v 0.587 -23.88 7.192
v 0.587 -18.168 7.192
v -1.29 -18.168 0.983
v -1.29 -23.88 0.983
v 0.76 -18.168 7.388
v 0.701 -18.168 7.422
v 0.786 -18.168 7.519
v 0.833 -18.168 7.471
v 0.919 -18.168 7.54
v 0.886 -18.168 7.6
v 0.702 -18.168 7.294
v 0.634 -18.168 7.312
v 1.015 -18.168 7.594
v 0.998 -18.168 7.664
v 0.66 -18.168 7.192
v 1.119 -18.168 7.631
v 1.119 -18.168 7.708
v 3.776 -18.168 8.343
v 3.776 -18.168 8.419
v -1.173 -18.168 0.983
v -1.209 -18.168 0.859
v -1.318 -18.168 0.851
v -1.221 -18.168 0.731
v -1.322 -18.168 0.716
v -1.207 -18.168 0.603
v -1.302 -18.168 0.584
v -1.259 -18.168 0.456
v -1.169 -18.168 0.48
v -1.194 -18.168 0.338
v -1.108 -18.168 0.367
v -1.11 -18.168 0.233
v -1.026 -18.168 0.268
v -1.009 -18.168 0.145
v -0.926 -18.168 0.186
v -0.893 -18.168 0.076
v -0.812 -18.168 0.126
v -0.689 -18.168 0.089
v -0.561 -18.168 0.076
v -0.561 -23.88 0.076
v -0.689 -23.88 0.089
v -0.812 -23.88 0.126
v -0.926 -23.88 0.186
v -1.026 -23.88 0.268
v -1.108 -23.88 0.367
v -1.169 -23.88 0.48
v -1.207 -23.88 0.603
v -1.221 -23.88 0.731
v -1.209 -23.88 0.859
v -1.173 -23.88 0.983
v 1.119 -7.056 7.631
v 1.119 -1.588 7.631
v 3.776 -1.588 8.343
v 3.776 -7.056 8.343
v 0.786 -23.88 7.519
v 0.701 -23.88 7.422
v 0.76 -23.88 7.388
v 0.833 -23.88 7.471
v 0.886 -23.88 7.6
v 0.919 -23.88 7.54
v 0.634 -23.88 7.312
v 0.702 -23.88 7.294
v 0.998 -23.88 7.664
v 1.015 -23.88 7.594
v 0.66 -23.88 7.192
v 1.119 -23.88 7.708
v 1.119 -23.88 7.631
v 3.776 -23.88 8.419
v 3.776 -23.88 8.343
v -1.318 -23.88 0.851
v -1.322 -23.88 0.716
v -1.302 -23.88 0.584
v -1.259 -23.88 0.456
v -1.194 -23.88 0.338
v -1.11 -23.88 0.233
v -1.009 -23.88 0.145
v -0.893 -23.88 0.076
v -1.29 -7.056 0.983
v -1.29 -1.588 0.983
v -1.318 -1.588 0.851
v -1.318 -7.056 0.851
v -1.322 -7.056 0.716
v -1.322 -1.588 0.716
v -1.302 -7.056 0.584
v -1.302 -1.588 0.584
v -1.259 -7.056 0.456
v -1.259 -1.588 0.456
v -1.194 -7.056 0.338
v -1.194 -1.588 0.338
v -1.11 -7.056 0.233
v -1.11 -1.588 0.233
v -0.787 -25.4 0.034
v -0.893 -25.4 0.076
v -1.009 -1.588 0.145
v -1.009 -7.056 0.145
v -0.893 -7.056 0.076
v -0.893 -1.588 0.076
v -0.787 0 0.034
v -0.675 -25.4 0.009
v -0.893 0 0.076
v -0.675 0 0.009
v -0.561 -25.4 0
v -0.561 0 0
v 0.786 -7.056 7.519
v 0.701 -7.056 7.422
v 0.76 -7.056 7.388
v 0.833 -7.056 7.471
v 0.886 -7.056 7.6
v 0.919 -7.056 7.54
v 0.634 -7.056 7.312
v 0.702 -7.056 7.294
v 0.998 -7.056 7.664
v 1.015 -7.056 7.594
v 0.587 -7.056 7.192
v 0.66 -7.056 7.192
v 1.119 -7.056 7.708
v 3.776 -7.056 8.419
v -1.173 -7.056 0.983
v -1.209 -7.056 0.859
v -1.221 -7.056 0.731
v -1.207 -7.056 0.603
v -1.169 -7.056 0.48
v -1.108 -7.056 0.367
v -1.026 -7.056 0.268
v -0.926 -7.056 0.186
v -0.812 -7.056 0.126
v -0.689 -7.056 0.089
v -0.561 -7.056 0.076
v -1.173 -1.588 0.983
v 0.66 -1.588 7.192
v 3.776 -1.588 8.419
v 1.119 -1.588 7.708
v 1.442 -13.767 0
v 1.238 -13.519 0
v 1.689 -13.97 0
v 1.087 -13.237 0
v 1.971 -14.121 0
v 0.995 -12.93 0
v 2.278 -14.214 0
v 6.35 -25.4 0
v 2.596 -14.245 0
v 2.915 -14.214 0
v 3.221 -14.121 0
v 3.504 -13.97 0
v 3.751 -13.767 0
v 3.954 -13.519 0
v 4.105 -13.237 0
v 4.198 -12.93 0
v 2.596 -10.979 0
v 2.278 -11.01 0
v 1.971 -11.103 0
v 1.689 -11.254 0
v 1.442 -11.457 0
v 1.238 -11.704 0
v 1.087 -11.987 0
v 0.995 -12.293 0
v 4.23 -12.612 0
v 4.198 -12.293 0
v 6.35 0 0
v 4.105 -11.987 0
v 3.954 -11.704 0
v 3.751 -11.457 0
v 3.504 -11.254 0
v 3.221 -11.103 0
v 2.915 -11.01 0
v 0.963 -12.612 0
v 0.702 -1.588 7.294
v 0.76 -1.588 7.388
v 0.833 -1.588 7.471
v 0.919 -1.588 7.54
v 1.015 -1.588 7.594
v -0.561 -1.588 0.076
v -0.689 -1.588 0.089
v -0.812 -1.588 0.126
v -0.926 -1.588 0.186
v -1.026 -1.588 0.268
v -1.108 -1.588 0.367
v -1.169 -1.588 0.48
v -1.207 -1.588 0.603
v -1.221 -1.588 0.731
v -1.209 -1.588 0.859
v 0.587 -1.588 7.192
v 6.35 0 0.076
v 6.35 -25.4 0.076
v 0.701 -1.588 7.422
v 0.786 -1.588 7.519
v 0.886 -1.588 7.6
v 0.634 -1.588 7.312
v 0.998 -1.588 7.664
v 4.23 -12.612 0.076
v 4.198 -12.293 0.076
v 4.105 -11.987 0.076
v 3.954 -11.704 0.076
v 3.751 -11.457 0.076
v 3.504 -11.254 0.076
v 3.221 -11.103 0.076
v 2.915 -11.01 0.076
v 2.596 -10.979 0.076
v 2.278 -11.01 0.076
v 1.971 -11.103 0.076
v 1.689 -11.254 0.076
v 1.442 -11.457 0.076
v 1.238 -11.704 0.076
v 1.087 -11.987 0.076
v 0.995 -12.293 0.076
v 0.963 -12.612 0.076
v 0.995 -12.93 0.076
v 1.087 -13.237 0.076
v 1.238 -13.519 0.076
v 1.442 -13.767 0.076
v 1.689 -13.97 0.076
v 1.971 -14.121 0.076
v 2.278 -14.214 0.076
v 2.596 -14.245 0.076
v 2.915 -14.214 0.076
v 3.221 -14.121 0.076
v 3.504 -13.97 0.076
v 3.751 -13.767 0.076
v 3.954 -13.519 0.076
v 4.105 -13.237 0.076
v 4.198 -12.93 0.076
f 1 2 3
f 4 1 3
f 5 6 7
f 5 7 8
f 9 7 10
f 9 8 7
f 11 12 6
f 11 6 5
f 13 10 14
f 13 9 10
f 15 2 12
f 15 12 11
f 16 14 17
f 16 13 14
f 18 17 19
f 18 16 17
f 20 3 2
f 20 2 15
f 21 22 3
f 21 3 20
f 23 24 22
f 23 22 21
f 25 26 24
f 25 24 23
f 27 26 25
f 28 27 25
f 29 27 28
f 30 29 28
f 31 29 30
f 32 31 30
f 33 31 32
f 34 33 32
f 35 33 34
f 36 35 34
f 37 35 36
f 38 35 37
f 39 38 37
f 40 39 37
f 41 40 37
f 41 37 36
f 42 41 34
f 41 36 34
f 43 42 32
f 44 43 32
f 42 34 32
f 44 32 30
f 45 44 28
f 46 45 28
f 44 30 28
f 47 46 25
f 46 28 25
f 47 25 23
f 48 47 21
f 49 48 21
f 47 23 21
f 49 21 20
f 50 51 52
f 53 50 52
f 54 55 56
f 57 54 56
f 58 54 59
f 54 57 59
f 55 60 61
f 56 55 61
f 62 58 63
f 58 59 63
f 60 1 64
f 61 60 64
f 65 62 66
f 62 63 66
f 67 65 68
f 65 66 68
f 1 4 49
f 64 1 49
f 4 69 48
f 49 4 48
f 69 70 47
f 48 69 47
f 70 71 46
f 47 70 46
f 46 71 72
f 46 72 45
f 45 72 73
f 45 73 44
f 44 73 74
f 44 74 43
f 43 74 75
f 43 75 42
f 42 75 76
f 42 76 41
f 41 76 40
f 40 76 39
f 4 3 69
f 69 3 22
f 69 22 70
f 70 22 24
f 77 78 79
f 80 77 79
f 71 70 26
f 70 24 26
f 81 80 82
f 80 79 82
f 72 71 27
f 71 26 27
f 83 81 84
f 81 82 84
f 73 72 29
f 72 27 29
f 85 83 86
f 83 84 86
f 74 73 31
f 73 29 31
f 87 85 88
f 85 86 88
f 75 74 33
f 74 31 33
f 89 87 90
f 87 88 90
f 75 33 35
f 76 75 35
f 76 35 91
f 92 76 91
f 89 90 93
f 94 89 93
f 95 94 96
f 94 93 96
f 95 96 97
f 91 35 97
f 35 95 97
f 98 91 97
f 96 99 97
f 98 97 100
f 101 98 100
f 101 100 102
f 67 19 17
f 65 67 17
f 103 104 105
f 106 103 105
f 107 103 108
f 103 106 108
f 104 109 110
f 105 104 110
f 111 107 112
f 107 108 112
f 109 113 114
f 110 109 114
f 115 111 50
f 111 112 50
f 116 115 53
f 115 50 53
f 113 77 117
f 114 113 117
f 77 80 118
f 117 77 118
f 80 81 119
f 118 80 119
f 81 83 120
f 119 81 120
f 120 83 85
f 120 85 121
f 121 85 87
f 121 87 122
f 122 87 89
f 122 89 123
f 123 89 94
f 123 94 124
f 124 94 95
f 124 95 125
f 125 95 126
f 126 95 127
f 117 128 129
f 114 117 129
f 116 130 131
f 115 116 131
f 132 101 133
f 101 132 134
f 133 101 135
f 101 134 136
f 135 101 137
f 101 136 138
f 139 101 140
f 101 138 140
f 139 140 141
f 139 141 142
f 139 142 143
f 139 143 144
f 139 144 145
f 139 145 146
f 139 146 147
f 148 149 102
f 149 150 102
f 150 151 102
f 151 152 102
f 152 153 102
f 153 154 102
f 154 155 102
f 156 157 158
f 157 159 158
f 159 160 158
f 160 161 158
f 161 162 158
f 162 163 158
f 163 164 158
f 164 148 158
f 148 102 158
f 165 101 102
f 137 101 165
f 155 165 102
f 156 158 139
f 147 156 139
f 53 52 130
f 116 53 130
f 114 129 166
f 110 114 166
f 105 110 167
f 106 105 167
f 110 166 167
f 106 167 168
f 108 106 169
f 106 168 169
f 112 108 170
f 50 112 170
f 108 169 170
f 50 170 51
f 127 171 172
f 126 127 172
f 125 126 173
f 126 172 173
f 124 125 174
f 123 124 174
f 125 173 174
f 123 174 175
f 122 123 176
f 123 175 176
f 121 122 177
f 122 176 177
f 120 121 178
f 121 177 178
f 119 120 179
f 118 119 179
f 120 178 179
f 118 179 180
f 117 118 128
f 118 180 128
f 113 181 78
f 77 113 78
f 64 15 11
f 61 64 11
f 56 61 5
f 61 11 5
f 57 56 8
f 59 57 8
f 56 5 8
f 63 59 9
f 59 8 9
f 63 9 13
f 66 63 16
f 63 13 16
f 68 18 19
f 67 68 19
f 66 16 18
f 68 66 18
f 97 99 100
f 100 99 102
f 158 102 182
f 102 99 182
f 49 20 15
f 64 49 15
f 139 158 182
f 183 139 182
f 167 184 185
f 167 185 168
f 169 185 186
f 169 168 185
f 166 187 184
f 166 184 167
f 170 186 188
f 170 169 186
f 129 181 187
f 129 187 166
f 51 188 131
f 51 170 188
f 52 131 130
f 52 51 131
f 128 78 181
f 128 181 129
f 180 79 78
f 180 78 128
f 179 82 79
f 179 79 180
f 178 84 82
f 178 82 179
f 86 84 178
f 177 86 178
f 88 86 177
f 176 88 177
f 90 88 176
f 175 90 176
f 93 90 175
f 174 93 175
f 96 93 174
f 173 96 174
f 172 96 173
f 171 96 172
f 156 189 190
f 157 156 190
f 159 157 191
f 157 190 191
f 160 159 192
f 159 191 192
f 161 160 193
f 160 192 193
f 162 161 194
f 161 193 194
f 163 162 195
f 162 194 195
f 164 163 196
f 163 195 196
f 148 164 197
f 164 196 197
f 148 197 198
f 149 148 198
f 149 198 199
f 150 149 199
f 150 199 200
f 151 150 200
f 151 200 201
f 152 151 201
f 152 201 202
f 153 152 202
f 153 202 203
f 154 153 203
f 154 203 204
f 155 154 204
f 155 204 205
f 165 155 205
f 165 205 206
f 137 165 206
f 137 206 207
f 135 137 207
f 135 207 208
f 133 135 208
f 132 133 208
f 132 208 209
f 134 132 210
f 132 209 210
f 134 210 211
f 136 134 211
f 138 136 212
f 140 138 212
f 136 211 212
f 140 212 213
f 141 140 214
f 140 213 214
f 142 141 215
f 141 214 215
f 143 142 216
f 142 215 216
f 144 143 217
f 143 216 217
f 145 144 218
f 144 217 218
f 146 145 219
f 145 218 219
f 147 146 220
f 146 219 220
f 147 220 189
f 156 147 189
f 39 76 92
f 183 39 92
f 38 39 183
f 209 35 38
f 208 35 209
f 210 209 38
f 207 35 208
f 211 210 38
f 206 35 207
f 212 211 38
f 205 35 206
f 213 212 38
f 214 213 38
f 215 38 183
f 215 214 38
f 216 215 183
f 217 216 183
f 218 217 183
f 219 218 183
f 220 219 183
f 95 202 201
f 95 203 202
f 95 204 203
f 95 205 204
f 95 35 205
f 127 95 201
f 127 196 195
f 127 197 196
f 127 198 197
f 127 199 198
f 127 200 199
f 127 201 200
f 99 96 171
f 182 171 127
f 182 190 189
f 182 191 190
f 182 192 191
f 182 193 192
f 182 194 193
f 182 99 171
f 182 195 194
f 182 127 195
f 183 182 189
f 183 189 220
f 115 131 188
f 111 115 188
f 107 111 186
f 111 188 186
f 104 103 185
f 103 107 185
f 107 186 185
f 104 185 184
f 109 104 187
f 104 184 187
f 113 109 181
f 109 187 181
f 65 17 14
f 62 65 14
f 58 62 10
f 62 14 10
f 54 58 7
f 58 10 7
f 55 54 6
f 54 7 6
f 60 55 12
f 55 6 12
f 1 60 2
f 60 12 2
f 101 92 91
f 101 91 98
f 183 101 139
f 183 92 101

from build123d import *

# Parameters (mm, degrees)
F1_DEPTH = 25.4
F3_W     = 8.148129
F3_H     = 5.55625
F3_W_2   = 7.948229
F3_H_2   = 1.5875
F3_W_3   = 8.837929
F4_DEPTH = 25.4
F5_R     = 1.633227
F6_DEPTH = 25.4


with BuildPart() as f1:
    # F0 (on Front) → F1 (new body)
    with BuildSketch(Plane.XZ):
        with BuildLine():
            Line((-0.561085, 0), (0, 0))
            Line((0, 0), (6.35, 0))
            Line((6.35, 0), (6.35, 0.0762))
            Line((6.35, 0.0762), (-0.561085, 0.0762))
            ThreePointArc((-0.561085, 0.0762), (-1.107829, 0.366771), (-1.172913, 0.982501))
            Line((-1.172913, 0.982501), (0.660235, 7.192055))
            ThreePointArc((0.660235, 7.192055), (0.833247, 7.470557), (1.118945, 7.631408))
            Line((1.118945, 7.631408), (3.776279, 8.343177))
            Line((3.776279, 8.343177), (3.776279, 8.419377))
            Line((3.776279, 8.419377), (1.118945, 7.707608))
            ThreePointArc((1.118945, 7.707608), (0.785934, 7.518885), (0.586698, 7.192055))
            Line((0.586698, 7.192055), (-1.290484, 0.982501))
            ThreePointArc((-1.290484, 0.982501), (-1.172913, 0.307785), (-0.561085, 0))
        make_face()
    extrude(amount=F1_DEPTH)

    # F3 (on offset) → F4 (cut)
    with BuildSketch(Plane.XY.offset(0.0762)):
        with Locations((1.40282, -9.833681)):
            Rectangle(F3_W, F3_H)
        with Locations((0.910564, -0.79375)):
            Rectangle(F3_W_2, F3_H_2)
        with Locations((3.026584, -24.674151)):
            Rectangle(F3_W_3, F3_H_2)
        with Locations((1.40282, -15.389931)):
            Rectangle(F3_W, F3_H)
    extrude(amount=F4_DEPTH, mode=Mode.SUBTRACT)

    # F5 (on face) → F6 (cut)
    with BuildSketch(Plane.XY.offset(0.0762)):
        with Locations((2.596372, -12.611806)):
            Circle(F5_R)
    extrude(amount=-F6_DEPTH, mode=Mode.SUBTRACT)


solid = f1.part
